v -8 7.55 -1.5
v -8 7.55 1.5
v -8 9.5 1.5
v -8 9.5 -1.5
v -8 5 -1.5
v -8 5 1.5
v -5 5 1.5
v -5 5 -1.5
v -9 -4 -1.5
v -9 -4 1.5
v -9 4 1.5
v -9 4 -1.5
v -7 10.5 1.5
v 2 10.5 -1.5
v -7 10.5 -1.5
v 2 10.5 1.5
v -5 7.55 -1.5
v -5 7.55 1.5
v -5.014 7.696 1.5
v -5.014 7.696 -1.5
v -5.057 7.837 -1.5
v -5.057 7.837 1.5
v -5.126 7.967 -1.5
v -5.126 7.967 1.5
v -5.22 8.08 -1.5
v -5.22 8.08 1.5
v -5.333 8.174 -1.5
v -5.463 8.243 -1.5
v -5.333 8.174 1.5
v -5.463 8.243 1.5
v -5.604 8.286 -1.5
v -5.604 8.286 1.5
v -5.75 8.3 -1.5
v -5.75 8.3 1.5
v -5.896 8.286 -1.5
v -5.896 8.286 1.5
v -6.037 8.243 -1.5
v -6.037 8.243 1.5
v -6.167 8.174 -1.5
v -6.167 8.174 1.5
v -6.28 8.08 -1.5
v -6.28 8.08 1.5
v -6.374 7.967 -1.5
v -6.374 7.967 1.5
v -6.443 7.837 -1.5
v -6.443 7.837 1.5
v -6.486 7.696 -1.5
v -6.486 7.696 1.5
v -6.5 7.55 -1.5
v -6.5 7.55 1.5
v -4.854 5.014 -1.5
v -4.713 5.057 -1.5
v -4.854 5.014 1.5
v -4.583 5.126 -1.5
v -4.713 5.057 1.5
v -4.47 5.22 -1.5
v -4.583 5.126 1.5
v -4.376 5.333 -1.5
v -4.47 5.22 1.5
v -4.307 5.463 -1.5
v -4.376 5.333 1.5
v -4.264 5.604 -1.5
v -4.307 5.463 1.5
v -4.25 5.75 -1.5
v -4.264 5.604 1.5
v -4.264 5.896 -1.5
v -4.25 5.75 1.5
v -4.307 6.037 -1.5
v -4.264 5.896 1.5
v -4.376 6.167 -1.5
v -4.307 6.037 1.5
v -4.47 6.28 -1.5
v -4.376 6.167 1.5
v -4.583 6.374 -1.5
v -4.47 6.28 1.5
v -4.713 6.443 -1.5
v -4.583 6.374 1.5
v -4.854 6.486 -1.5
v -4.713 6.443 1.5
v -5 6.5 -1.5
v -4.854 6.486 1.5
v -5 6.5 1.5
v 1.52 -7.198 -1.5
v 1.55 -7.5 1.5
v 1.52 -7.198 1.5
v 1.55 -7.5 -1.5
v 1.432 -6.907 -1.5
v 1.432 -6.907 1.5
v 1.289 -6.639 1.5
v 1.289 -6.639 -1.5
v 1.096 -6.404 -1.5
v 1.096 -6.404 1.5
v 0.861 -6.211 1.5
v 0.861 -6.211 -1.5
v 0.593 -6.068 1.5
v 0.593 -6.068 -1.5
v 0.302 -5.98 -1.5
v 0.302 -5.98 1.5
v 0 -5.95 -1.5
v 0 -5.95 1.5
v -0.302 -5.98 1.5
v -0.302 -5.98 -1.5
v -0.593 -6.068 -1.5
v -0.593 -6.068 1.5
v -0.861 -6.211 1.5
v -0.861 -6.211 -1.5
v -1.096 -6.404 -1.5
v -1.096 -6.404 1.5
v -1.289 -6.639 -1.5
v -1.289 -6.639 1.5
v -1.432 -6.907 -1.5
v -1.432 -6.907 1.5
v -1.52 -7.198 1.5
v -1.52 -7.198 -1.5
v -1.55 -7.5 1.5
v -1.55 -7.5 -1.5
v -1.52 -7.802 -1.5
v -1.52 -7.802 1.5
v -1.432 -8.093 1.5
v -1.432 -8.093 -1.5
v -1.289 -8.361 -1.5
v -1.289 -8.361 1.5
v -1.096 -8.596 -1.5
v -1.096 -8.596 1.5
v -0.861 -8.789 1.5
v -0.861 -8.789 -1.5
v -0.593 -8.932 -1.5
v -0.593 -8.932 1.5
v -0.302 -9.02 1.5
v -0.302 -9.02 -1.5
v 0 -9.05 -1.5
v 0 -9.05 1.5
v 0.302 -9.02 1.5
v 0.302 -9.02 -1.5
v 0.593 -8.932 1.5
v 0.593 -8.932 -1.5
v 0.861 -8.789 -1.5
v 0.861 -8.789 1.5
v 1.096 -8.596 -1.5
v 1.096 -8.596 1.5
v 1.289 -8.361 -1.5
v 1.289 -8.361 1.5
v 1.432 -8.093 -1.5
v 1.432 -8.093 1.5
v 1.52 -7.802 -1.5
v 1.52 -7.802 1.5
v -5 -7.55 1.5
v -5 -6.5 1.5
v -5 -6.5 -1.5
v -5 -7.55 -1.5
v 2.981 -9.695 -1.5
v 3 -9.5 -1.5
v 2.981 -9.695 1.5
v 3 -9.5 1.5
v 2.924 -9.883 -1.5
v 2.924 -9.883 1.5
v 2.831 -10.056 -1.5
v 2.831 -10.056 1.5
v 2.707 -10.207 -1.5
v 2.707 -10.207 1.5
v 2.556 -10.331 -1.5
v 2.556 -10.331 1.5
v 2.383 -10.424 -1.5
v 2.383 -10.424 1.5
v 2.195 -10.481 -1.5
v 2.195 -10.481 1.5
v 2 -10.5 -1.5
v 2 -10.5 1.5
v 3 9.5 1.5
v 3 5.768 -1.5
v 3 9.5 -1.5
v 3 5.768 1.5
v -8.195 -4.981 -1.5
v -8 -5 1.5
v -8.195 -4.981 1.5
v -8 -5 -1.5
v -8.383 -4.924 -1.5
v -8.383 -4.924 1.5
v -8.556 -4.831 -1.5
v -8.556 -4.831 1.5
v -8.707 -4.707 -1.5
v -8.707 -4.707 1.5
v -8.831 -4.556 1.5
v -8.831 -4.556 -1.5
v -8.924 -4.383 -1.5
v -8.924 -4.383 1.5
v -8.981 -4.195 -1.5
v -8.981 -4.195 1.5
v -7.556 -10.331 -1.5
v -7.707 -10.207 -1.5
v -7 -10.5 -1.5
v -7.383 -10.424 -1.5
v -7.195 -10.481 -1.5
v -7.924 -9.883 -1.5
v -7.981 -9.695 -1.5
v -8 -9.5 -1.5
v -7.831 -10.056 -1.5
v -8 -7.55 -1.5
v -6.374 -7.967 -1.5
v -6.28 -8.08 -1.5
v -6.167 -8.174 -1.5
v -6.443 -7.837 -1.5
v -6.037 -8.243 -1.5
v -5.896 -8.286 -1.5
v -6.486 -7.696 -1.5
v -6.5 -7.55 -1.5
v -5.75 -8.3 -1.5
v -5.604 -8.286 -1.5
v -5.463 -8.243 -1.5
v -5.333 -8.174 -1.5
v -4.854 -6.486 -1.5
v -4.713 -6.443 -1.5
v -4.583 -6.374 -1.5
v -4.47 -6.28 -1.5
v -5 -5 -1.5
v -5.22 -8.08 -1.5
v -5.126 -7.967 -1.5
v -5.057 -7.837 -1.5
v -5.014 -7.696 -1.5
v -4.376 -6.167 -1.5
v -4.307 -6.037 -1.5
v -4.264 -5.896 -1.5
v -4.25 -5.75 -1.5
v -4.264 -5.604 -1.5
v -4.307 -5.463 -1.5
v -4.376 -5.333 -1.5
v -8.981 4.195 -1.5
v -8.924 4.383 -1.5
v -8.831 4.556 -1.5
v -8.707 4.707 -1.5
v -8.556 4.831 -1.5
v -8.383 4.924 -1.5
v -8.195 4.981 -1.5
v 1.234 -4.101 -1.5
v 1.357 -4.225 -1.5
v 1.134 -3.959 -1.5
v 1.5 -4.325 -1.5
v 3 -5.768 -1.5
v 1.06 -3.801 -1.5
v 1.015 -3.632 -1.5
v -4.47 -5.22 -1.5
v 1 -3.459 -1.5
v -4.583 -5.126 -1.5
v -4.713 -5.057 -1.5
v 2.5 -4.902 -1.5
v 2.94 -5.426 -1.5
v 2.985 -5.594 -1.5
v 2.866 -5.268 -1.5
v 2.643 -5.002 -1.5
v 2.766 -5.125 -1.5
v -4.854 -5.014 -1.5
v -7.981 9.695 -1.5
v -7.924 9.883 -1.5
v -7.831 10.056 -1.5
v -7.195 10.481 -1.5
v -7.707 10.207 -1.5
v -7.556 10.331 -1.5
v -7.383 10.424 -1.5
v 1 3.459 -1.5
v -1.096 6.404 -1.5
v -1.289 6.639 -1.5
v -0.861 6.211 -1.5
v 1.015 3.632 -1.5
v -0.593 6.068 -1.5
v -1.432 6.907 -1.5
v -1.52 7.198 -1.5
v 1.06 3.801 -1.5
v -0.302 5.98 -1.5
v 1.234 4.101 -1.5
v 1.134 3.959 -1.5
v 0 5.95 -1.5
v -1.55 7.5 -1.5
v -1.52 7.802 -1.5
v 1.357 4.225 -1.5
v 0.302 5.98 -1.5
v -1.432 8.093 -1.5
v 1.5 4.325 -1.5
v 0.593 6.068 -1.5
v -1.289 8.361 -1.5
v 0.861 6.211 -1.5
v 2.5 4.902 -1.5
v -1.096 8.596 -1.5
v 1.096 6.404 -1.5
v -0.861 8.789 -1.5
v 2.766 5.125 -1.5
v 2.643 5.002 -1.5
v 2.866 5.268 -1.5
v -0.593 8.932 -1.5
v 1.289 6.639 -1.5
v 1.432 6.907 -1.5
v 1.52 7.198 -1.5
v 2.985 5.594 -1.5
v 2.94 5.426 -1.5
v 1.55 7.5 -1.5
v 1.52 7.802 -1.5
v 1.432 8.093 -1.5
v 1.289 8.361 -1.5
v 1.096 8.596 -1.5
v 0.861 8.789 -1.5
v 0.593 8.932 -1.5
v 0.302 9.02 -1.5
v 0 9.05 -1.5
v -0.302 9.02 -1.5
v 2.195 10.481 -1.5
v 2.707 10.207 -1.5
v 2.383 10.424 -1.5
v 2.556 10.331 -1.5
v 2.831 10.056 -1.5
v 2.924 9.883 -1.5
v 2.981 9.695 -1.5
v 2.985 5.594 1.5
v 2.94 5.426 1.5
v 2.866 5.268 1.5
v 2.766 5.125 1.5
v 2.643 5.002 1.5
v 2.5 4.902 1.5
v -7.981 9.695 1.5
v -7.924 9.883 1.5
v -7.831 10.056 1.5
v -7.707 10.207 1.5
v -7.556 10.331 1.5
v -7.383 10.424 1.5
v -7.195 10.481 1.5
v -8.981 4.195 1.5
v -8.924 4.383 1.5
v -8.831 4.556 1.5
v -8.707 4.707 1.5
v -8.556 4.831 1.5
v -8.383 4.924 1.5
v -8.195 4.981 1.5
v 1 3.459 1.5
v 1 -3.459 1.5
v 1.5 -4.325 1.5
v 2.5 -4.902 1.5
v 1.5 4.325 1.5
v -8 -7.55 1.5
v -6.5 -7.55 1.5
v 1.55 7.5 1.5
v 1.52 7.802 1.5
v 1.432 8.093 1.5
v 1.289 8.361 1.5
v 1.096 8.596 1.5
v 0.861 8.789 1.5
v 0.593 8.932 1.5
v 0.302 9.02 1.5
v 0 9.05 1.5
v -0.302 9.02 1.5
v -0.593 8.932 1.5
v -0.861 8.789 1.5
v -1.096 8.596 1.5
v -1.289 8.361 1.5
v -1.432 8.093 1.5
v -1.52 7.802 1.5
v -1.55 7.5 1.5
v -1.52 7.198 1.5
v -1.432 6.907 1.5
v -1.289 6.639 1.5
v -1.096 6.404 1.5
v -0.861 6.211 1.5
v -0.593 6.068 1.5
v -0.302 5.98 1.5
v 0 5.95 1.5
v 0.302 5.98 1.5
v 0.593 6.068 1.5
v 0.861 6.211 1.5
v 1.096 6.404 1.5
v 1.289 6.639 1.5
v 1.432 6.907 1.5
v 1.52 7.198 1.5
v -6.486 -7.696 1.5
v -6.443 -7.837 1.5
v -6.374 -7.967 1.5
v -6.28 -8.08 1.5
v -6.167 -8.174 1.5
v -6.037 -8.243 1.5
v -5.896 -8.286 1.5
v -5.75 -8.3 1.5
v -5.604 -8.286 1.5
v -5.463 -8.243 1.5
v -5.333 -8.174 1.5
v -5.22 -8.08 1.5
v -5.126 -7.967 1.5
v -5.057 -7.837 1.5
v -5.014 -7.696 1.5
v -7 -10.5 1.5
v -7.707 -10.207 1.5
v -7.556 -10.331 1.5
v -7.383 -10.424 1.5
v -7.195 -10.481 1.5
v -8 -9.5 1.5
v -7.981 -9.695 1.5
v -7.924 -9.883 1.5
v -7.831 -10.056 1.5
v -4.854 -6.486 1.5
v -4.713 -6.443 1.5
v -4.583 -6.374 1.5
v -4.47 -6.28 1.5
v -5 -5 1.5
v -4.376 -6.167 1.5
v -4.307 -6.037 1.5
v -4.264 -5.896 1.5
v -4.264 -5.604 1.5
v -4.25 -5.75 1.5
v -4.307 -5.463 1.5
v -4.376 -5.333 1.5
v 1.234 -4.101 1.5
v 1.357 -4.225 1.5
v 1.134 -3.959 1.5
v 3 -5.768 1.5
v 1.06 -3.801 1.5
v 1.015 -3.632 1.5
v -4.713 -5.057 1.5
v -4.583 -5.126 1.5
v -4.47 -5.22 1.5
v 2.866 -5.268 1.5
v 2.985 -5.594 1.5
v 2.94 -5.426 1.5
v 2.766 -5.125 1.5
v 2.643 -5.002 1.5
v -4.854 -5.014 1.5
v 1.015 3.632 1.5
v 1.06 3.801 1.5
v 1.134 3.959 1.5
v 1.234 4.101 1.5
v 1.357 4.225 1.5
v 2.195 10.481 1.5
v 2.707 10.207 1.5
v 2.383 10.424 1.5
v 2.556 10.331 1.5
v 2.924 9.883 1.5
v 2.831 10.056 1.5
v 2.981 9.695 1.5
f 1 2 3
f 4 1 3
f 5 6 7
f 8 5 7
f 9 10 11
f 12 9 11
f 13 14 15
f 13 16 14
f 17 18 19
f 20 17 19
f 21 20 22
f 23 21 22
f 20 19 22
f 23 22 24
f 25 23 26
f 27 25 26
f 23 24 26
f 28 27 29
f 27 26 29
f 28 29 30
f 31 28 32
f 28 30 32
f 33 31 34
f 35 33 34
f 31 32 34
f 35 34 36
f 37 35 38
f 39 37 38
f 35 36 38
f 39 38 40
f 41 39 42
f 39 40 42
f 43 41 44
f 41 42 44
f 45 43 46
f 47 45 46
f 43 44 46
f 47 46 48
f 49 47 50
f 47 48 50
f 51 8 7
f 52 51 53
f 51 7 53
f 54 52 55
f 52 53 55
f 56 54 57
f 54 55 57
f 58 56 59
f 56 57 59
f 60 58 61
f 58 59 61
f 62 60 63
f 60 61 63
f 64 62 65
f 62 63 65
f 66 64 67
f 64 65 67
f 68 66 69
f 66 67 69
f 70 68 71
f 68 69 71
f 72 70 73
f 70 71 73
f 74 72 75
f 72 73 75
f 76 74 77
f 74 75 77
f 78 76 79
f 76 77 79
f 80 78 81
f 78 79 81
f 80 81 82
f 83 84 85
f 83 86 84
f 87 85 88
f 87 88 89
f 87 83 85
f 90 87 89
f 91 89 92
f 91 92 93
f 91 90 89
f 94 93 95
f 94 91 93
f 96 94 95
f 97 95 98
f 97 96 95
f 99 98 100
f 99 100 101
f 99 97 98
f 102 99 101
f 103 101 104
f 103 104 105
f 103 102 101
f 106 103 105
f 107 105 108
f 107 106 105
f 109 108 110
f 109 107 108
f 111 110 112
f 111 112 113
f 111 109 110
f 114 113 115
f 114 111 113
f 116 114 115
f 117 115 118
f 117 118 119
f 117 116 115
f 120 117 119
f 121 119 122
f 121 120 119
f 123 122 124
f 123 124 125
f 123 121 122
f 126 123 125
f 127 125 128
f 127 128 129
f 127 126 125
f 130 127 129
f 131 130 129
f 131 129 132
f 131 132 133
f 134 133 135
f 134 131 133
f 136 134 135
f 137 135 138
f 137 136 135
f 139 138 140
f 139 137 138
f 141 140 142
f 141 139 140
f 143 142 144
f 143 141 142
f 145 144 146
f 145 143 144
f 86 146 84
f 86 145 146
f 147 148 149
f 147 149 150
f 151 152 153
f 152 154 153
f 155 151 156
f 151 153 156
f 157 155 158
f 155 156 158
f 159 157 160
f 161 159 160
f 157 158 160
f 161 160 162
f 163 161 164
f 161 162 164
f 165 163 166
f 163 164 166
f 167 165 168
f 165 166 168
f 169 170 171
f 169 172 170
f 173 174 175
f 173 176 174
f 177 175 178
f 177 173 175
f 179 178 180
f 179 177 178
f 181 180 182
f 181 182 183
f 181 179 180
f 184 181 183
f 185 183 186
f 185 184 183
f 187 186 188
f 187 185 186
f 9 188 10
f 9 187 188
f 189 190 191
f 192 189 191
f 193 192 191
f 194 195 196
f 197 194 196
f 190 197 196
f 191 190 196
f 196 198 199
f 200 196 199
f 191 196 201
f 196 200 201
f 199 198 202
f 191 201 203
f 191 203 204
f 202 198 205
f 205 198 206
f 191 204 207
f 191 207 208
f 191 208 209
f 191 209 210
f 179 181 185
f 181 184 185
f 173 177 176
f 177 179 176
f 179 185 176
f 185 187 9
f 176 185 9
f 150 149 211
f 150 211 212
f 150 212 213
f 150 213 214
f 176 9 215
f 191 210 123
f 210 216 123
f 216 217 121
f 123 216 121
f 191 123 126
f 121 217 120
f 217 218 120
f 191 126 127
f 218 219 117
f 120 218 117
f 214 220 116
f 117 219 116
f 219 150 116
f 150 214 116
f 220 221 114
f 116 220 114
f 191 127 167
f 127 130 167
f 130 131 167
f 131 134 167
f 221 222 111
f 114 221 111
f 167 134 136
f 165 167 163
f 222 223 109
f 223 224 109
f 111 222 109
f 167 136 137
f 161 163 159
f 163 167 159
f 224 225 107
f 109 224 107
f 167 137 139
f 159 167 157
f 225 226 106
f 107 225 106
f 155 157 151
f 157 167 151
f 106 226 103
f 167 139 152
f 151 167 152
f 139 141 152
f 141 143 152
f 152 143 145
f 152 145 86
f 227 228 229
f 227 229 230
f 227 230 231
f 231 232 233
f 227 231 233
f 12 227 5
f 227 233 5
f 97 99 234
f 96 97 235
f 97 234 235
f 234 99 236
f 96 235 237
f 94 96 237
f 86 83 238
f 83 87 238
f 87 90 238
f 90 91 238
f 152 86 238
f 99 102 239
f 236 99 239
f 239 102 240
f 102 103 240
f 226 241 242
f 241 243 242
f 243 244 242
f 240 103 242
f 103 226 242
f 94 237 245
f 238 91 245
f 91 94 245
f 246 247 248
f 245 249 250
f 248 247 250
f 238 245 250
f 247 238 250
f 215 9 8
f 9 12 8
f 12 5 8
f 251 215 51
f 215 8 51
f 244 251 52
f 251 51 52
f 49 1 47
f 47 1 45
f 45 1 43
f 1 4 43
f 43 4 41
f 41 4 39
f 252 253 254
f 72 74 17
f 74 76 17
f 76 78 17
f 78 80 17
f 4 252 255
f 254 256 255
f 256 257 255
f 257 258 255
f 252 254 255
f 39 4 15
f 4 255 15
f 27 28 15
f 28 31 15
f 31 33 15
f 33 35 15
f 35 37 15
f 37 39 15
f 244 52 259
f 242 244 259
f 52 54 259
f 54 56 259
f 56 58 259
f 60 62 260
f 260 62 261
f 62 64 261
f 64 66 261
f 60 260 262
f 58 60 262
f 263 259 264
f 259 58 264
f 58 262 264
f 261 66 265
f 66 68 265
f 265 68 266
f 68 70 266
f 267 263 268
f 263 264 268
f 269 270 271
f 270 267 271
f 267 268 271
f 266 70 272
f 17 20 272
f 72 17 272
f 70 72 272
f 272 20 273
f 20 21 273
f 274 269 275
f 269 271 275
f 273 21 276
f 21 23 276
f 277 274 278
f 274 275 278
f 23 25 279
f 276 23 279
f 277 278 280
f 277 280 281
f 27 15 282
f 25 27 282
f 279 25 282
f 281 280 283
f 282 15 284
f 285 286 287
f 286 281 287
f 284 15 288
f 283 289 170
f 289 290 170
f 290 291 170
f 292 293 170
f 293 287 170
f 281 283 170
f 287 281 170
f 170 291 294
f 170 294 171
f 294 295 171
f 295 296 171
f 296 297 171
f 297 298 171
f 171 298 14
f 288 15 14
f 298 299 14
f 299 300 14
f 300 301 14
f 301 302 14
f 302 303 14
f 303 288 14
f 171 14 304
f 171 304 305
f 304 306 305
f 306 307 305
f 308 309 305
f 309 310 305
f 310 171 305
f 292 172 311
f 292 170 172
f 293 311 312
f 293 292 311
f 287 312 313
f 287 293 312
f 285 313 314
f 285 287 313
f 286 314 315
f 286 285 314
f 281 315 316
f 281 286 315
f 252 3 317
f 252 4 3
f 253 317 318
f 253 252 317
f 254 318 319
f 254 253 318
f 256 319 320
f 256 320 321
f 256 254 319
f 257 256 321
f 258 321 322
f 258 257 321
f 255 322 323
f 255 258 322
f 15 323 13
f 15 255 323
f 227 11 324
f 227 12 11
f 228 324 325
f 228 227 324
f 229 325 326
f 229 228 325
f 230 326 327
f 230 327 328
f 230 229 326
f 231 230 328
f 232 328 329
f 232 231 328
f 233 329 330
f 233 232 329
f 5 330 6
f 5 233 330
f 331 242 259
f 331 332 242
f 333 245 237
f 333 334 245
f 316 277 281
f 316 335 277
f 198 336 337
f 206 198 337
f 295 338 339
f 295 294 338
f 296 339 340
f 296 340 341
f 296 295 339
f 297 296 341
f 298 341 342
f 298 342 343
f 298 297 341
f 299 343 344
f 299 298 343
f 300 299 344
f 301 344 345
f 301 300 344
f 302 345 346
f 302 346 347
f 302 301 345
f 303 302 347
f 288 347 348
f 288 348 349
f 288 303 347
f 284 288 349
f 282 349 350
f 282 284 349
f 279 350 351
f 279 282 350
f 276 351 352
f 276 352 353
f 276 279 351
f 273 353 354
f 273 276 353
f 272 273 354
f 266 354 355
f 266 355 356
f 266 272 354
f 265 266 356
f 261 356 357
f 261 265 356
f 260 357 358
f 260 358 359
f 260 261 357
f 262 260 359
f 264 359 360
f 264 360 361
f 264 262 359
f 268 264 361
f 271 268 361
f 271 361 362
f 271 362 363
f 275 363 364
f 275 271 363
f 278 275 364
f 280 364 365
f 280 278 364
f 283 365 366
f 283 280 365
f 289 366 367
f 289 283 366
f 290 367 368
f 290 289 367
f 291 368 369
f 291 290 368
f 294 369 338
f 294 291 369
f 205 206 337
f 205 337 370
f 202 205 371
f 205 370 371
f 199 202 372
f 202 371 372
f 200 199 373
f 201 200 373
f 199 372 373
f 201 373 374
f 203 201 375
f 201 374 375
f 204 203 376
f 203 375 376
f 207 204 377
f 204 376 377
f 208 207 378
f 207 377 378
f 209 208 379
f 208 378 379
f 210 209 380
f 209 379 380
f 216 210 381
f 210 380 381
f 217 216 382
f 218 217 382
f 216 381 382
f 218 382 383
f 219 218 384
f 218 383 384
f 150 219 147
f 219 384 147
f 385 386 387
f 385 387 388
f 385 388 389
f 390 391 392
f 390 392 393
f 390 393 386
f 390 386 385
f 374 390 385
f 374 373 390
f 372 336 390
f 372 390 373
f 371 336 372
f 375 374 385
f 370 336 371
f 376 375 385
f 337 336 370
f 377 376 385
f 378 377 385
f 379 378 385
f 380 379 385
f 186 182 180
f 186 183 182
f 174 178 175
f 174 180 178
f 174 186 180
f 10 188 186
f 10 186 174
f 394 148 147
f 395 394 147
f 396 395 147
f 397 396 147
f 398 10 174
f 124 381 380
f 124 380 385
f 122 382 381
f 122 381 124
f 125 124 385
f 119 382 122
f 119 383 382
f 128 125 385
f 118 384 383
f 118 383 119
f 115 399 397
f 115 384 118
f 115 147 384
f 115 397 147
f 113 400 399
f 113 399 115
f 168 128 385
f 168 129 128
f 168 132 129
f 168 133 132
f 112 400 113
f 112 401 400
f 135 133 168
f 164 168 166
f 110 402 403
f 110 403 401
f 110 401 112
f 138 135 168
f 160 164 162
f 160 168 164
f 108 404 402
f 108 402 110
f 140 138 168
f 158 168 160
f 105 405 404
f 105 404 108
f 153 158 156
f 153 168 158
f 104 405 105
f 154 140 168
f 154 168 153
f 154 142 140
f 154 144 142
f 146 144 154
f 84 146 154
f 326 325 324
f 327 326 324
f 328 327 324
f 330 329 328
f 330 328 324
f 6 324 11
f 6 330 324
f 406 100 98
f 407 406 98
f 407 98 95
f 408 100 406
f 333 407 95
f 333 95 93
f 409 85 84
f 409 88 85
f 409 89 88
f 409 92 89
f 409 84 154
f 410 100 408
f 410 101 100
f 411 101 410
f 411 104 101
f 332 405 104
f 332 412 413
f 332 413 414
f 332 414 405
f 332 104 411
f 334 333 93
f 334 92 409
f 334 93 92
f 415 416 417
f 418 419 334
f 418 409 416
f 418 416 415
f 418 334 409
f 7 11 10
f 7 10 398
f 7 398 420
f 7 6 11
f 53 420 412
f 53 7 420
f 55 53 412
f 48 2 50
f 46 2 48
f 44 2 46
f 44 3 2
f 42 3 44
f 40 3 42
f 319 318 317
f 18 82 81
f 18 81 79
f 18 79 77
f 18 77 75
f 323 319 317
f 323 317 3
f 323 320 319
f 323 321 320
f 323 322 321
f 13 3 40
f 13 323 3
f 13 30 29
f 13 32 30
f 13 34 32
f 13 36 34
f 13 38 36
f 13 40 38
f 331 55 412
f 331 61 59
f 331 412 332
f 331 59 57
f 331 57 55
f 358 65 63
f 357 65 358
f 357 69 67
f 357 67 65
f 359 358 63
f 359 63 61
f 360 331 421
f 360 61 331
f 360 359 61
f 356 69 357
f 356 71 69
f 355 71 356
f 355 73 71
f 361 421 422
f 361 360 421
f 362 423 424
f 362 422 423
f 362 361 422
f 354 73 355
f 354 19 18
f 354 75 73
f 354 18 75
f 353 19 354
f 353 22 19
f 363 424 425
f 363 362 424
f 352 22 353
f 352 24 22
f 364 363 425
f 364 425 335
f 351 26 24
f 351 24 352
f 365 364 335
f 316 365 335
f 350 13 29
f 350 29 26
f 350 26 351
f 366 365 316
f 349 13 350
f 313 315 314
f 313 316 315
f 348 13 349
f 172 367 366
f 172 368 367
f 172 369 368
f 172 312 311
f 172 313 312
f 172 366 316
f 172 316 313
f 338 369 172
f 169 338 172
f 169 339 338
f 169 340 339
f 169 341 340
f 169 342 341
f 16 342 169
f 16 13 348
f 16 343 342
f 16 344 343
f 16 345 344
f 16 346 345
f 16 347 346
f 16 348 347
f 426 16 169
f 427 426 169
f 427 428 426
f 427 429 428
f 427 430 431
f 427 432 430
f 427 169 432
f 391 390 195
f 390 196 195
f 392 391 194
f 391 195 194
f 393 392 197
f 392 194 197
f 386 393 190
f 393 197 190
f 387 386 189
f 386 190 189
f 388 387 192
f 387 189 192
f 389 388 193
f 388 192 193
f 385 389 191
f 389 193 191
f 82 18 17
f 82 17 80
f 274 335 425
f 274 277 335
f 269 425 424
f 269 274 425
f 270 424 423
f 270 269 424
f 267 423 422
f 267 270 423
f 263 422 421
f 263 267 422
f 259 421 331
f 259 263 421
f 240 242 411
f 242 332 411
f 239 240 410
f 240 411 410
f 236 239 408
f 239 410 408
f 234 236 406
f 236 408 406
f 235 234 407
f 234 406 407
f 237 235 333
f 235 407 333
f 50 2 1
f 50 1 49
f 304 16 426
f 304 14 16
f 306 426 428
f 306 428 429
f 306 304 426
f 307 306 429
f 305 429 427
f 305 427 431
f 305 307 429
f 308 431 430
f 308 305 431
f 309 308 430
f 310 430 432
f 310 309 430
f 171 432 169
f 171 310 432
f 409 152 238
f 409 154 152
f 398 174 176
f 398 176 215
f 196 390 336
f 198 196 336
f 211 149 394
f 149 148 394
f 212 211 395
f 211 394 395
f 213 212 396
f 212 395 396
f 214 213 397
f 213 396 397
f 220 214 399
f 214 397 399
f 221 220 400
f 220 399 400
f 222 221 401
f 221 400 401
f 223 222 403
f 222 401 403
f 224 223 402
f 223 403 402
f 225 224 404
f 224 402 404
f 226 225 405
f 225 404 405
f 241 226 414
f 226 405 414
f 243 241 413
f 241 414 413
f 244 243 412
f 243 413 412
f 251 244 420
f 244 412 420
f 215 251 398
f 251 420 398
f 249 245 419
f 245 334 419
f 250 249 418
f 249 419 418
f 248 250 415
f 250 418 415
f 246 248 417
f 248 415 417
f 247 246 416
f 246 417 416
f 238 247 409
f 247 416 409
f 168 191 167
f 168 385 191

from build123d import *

# Parameters (mm, degrees)
SKETCH_1_R          = 1.55
EXTRUDE_1_DEPTH     = 1.5
SKETCH_2_W          = 3
SKETCH_2_H          = 2.95
SKETCH_2_W_2        = 4
SKETCH_2_H_2        = 10
EXTRUDE_2_DEPTH     = 3
SKETCH_3_R          = 0.75
CUT_EXTRUDE_1_DEPTH = 4
FILLET_1_R          = 1


with BuildPart() as part:
    # 草图1 → 凸台-拉伸1 (new body, symmetric)
    with BuildSketch(Plane.XY):
        Polygon((-5, 10.5), (-5, -10.5), (3, -10.5), (3, -5.190598923), (1, -4.035898385), (1, 4.035898385), (3, 5.190598923), (3, 10.5), align=None)
        with Locations((0, 7.5)):
            Circle(SKETCH_1_R, mode=Mode.SUBTRACT)
        with Locations((0, -7.5)):
            Circle(SKETCH_1_R, mode=Mode.SUBTRACT)
    extrude(amount=EXTRUDE_1_DEPTH, both=True)

    # 草图2 → 凸台-拉伸2 (add)
    with BuildSketch(Plane.XY.offset(1.5)):
        with Locations((-6.5, -9.025)):
            Rectangle(SKETCH_2_W, SKETCH_2_H)
        with Locations((-7, 0)):
            Rectangle(SKETCH_2_W_2, SKETCH_2_H_2)
        with Locations((-6.5, 9.025)):
            Rectangle(SKETCH_2_W, SKETCH_2_H)
    extrude(amount=-EXTRUDE_2_DEPTH)

    # 草图3 → 切除-拉伸1 (cut, through all)
    with BuildSketch(Plane.XY.offset(1.5)):
        with Locations((-5.75, 7.55)):
            Circle(SKETCH_3_R)
        with Locations((-5, 5.75)):
            Circle(SKETCH_3_R)
        with Locations((-5, -5.75)):
            Circle(SKETCH_3_R)
        with Locations((-5.75, -7.55)):
            Circle(SKETCH_3_R)
    extrude(amount=-CUT_EXTRUDE_1_DEPTH, mode=Mode.SUBTRACT)

    # 圆角1
    fillet_1_edges = [part.edges().sort_by_distance(p)[0] for p in [
        (3, 10.5, 0),
        (3, 5.190598923, 0),
        (1, 4.035898385, 0),
        (1, -4.035898385, 0),
        (3, -5.190598923, 0),
        (3, -10.5, 0),
        (-8, 10.5, 0),
        (-8, -10.5, 0),
        (-9, 5, 0),
        (-9, -5, 0),
    ]]
    fillet(fillet_1_edges, radius=FILLET_1_R)


solid = part.part
